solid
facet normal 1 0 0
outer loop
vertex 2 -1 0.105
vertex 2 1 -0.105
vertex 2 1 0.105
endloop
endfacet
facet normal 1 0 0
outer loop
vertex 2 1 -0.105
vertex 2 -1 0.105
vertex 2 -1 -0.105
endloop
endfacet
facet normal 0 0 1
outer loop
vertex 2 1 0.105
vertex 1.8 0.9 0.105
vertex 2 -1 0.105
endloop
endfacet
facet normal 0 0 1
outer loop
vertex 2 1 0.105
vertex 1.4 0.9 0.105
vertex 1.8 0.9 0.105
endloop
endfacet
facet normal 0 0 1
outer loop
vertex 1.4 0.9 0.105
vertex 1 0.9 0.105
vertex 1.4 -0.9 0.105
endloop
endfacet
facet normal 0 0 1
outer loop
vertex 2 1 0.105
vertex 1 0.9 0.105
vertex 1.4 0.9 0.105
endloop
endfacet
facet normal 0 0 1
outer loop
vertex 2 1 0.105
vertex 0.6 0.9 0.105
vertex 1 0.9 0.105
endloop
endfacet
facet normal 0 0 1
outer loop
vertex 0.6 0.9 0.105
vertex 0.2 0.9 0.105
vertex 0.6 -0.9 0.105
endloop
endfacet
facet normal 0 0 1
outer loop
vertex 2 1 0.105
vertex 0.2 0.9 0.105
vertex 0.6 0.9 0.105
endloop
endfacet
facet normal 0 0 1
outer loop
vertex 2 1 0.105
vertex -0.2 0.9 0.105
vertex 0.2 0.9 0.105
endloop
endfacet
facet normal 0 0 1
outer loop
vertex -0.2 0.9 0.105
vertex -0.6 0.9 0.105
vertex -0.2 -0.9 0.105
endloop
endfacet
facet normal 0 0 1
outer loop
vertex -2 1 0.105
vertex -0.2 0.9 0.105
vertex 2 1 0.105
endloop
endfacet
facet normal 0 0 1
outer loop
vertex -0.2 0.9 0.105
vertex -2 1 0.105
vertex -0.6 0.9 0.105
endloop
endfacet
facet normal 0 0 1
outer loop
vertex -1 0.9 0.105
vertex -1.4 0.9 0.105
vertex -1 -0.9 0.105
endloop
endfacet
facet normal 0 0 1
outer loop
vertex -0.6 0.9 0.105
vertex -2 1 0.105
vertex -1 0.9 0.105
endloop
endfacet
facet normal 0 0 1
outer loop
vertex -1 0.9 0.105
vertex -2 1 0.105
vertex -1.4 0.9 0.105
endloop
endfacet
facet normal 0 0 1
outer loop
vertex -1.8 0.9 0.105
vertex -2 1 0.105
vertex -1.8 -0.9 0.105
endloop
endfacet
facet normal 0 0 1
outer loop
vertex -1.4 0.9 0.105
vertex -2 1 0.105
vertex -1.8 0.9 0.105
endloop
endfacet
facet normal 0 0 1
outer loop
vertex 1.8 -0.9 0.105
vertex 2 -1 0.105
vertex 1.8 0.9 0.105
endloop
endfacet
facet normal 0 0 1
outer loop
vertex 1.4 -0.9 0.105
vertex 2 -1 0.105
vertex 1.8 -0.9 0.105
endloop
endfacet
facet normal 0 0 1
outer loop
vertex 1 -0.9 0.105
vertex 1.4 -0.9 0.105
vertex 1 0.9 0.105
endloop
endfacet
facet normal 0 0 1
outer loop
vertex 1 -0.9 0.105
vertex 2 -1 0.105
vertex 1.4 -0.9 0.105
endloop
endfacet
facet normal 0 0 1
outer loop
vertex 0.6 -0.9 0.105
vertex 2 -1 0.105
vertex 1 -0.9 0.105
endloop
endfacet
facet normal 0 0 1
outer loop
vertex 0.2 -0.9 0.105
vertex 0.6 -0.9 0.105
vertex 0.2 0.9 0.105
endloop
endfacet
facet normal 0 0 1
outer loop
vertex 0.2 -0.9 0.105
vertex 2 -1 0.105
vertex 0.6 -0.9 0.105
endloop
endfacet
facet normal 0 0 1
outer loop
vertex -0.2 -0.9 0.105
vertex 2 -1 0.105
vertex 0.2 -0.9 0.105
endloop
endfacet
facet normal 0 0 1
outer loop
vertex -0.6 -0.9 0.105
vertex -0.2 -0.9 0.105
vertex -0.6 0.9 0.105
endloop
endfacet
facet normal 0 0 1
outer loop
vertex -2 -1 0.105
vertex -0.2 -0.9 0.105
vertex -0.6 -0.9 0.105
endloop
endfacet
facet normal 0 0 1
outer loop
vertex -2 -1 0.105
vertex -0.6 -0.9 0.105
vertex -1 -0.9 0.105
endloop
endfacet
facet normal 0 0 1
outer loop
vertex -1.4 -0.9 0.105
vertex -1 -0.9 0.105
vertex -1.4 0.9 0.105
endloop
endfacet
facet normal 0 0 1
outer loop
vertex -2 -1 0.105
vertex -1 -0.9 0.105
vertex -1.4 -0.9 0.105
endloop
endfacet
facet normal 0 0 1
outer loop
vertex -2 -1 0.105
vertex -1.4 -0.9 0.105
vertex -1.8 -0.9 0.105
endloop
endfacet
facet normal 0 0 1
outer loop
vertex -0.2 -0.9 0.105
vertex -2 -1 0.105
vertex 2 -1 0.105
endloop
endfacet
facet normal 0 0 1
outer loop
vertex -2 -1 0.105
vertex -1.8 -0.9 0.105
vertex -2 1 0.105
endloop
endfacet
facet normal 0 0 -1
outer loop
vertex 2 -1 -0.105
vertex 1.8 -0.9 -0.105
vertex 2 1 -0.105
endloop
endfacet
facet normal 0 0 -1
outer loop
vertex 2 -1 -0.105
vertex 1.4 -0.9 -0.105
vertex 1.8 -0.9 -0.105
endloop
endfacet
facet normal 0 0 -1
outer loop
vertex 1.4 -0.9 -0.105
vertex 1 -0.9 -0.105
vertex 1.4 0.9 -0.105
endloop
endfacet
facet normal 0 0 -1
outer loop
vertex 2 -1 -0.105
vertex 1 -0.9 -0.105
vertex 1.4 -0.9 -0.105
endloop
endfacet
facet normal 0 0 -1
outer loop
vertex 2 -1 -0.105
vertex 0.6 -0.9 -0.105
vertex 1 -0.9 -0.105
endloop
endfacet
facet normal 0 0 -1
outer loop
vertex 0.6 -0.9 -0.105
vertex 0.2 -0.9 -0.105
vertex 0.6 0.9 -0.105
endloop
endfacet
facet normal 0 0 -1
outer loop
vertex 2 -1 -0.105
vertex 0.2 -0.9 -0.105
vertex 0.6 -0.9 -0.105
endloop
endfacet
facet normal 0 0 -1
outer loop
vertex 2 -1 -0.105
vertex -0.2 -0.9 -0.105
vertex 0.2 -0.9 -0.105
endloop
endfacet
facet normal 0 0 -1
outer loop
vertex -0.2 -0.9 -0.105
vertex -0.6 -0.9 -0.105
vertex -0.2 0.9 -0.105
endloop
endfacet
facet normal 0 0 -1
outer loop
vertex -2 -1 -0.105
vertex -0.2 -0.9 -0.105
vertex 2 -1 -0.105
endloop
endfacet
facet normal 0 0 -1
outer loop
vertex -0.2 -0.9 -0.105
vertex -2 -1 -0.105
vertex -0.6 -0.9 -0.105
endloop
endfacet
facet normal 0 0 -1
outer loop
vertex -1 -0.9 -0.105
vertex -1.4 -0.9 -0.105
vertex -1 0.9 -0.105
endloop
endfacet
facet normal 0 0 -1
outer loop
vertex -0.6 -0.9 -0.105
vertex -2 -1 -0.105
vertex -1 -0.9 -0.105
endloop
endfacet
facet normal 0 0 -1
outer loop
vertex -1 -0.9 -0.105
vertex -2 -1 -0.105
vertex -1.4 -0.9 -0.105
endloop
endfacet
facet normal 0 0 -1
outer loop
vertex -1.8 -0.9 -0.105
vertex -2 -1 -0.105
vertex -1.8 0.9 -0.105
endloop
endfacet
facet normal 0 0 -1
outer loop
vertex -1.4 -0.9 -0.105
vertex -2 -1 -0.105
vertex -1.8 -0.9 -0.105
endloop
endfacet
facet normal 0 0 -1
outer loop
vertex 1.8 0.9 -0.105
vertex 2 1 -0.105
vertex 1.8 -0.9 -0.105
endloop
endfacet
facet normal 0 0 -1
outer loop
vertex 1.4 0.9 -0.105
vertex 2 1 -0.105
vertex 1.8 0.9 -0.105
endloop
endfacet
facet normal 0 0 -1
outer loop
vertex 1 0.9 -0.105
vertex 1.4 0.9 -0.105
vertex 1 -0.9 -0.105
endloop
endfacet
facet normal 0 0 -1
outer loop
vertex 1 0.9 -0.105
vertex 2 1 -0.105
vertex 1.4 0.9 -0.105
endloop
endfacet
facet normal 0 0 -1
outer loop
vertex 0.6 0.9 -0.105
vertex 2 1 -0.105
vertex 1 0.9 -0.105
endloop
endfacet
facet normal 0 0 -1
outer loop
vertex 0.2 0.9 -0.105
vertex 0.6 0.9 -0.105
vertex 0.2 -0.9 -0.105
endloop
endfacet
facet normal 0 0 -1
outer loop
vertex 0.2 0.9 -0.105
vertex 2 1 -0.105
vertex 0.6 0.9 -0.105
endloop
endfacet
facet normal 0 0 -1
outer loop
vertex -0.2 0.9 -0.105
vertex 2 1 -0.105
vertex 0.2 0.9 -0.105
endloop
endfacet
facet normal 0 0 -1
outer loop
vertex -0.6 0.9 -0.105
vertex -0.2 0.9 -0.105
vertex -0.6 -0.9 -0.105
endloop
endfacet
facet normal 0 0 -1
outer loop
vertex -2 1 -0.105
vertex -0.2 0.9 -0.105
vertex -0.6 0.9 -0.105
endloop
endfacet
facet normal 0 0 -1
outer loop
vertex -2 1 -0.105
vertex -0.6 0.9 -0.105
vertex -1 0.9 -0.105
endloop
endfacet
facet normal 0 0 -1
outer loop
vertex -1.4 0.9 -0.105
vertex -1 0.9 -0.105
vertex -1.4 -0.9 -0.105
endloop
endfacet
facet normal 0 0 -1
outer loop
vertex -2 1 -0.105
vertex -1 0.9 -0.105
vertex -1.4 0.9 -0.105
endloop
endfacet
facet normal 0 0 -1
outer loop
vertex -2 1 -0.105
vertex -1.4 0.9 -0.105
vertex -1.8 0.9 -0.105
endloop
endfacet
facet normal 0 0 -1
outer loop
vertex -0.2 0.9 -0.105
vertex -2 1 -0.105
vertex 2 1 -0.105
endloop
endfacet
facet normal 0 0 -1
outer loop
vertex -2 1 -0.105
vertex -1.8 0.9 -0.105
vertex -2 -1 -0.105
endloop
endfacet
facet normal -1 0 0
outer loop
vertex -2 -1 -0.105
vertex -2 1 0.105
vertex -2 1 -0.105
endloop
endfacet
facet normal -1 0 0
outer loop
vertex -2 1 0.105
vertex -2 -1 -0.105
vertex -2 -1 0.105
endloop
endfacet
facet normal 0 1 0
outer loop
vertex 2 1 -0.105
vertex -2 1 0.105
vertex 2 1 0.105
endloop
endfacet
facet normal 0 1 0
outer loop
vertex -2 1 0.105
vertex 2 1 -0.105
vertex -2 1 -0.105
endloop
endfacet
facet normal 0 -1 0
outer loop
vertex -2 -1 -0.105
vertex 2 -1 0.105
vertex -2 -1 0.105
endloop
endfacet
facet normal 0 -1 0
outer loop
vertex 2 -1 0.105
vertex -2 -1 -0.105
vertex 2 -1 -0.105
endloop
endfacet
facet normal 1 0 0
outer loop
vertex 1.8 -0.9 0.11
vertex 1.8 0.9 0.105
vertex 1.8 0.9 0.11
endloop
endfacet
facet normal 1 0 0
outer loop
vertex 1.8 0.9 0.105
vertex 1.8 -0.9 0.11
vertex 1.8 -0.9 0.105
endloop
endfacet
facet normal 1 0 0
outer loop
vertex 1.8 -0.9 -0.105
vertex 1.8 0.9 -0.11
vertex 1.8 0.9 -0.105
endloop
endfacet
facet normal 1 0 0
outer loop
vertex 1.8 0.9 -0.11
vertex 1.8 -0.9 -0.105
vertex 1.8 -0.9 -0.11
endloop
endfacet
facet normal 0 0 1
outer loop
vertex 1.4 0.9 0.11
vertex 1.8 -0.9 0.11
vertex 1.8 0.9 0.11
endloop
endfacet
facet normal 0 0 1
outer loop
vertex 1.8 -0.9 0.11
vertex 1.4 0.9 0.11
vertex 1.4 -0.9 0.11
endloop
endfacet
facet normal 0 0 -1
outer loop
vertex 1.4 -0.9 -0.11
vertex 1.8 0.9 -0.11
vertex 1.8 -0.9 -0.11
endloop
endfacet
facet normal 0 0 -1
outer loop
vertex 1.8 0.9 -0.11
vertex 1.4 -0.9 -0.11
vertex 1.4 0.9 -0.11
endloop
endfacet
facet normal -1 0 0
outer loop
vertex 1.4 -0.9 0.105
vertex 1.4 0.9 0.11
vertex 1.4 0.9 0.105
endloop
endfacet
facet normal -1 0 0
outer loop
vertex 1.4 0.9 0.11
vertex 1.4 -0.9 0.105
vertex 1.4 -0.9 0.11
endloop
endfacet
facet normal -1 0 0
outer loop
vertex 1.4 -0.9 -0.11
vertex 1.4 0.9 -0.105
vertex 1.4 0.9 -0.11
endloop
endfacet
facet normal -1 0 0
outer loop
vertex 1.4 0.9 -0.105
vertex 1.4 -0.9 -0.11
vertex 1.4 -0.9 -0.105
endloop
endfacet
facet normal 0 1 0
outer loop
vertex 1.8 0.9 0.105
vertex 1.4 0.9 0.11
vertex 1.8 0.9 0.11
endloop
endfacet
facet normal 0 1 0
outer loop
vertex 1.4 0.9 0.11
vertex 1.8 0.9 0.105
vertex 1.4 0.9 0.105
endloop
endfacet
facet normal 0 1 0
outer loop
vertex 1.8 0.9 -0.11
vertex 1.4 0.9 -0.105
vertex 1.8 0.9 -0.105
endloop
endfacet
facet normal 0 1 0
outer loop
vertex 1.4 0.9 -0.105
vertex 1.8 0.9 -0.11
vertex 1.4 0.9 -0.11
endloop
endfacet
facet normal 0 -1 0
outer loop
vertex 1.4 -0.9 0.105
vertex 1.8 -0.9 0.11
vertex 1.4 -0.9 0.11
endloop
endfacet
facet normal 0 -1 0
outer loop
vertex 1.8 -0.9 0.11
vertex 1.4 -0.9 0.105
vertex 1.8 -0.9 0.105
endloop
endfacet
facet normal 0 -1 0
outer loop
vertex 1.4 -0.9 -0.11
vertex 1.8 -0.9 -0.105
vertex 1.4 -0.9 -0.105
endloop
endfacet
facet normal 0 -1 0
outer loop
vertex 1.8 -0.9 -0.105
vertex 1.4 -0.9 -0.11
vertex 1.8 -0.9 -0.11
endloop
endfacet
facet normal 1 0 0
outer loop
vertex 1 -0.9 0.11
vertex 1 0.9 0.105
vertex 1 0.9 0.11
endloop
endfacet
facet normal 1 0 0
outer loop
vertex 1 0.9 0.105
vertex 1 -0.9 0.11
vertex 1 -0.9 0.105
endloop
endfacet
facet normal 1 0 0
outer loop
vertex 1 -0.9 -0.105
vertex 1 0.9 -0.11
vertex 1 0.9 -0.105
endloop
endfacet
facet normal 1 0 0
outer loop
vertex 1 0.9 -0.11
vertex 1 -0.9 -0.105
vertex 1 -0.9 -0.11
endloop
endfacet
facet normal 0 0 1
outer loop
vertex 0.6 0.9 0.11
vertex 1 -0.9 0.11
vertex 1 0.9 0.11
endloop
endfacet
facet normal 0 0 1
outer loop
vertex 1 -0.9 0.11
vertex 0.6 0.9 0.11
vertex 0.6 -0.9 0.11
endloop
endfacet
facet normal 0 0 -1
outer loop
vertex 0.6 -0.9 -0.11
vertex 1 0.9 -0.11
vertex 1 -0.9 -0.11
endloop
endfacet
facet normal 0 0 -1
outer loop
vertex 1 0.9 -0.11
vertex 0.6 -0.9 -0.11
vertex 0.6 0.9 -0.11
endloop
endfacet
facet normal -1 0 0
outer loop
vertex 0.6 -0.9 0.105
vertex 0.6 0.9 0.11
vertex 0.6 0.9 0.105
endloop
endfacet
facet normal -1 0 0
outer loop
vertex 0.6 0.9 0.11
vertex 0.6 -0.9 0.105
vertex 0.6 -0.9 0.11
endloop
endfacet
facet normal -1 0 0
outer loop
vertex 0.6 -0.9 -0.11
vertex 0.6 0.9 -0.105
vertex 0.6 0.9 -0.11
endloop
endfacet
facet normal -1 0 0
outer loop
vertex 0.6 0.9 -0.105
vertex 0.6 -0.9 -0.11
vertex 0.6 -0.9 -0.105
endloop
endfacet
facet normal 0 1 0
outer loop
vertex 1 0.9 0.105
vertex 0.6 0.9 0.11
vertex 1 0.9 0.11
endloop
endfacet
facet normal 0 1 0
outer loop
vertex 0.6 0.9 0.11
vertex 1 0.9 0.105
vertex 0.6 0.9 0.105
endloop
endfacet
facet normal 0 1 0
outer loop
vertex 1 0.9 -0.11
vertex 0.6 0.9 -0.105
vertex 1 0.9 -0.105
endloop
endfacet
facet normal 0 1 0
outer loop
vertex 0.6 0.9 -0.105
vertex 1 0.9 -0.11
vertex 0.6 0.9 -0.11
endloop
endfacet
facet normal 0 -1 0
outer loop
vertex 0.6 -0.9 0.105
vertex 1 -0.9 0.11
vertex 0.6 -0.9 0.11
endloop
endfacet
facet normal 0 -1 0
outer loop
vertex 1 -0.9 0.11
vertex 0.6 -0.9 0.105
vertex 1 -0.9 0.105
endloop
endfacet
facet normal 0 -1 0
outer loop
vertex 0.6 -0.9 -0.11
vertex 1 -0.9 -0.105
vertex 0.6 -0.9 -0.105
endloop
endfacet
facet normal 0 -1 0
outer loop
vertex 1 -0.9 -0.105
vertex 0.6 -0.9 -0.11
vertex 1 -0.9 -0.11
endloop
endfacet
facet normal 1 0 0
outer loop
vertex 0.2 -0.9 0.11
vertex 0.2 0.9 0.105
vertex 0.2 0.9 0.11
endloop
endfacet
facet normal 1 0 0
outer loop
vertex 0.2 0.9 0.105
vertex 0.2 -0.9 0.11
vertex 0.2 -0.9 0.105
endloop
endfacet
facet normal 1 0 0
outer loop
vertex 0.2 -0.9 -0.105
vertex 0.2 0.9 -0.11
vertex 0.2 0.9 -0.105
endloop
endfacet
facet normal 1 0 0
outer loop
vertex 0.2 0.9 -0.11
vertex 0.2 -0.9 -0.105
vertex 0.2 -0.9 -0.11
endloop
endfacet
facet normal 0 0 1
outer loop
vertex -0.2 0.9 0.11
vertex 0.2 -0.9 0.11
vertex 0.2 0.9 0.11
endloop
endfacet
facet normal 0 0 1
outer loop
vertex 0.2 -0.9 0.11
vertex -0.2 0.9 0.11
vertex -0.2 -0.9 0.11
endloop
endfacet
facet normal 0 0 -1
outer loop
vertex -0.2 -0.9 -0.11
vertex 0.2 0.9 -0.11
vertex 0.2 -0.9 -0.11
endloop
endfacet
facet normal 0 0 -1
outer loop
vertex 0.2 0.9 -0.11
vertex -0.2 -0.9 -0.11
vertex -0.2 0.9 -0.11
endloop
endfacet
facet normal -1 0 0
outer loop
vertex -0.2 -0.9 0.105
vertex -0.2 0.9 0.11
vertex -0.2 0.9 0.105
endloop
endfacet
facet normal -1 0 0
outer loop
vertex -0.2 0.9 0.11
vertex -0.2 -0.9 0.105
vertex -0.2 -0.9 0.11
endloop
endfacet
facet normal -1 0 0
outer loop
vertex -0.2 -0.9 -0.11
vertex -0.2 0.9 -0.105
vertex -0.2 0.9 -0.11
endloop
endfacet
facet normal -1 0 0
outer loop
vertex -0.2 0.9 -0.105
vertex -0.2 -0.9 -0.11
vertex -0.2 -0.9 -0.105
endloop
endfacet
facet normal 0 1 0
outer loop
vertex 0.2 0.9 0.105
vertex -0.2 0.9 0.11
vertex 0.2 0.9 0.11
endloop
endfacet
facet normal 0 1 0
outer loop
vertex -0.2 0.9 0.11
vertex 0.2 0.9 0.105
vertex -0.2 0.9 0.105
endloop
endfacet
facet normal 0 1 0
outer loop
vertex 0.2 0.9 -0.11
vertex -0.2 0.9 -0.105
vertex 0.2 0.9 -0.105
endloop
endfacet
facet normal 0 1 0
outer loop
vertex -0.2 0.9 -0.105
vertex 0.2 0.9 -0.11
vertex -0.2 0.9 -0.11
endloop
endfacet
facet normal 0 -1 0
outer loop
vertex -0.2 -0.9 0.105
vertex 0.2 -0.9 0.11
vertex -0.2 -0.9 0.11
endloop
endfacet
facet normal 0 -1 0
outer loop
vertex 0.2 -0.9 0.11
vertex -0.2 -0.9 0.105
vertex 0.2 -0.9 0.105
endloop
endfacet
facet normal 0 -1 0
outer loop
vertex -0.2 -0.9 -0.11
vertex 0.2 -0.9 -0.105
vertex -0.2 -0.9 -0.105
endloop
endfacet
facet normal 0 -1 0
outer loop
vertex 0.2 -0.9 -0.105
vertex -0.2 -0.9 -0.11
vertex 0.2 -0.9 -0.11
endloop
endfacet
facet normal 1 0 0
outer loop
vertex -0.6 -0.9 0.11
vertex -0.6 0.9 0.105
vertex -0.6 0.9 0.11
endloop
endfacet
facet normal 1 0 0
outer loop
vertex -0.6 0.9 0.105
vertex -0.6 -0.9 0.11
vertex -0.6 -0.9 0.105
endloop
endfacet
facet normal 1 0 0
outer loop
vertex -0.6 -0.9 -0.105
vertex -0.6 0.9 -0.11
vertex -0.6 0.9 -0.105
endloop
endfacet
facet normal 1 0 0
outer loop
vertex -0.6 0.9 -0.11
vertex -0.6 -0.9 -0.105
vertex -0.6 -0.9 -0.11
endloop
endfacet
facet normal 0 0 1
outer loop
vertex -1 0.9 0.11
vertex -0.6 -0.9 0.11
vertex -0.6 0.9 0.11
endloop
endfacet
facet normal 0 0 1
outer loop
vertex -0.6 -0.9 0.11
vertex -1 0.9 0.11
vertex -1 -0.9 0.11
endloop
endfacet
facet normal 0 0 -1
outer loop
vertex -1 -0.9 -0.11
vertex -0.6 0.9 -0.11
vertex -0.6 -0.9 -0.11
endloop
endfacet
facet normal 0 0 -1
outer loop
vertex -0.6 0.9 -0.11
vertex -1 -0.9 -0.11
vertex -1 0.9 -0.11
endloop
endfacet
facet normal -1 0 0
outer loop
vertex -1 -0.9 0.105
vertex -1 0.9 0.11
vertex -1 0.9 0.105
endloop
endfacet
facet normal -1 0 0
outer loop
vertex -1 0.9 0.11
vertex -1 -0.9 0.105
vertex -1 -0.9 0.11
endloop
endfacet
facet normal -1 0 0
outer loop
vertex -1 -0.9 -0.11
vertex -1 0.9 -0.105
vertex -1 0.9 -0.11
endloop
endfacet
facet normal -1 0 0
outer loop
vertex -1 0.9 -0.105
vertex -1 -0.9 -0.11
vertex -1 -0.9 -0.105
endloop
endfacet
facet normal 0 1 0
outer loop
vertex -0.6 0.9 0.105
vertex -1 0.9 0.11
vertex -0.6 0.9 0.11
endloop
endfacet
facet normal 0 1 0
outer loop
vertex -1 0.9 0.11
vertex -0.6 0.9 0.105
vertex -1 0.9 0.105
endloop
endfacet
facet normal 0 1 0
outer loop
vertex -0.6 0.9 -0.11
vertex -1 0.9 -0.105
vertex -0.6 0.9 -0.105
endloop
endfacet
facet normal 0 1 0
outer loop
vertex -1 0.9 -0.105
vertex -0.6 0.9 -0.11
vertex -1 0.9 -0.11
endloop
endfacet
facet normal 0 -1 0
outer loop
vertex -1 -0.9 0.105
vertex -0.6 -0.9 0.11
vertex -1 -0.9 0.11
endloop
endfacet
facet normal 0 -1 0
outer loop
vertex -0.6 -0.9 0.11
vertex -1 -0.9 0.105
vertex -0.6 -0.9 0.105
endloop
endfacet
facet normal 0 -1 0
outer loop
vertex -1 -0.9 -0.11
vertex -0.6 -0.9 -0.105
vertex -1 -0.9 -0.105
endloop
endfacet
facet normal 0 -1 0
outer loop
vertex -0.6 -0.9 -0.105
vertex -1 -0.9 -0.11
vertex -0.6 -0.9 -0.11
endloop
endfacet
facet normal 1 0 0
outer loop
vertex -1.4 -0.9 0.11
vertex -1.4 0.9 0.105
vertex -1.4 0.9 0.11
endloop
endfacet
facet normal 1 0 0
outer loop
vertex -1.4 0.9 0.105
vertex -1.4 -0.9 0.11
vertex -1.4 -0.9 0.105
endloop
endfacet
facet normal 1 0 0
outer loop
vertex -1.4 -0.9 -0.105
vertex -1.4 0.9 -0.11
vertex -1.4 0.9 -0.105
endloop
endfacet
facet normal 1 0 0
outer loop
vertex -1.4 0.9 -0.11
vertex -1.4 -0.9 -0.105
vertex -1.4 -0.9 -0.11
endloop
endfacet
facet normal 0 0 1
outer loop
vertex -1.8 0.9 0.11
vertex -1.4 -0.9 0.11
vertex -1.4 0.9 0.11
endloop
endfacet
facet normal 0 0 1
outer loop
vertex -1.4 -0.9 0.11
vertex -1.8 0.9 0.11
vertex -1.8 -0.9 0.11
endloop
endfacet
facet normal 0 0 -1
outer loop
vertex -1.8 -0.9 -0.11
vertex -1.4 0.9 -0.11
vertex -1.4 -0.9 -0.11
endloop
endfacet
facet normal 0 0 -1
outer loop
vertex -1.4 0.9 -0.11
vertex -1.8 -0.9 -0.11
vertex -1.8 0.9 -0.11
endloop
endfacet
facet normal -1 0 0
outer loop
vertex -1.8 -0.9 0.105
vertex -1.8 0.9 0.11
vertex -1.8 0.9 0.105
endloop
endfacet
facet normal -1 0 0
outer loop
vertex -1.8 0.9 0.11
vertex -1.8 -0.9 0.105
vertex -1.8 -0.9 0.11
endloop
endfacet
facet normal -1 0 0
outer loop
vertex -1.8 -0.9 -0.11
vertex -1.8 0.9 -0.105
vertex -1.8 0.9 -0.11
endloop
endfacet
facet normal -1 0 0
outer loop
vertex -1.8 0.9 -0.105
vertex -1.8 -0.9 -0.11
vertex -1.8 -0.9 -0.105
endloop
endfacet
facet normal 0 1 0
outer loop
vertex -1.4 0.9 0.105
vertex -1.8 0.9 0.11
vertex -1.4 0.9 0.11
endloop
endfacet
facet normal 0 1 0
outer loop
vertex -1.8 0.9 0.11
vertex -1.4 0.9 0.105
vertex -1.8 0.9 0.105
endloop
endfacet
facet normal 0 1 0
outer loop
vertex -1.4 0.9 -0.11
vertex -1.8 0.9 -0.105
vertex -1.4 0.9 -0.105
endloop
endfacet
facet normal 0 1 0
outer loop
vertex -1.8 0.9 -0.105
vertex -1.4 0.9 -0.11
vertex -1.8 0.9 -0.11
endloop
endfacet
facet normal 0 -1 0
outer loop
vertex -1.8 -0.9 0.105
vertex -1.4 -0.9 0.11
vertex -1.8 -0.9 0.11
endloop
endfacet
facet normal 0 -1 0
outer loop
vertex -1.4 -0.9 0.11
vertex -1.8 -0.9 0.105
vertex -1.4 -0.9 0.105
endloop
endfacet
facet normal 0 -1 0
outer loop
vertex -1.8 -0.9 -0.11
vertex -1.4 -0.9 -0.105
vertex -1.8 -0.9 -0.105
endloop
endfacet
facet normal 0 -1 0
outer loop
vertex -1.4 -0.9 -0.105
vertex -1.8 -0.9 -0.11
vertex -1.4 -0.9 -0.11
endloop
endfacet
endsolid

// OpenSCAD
module Street_02(){

union(){
color("#3b4747")
cube([4,2,0.21], center = true);

translate([1.6,0,0])
color("white")
cube([0.4,1.8,0.22], center = true);

translate([0.8,0,0])
color("white")
cube([0.4,1.8,0.22], center = true);


translate([0,0,0])
color("white")
cube([0.4,1.8,0.22], center = true);


translate([-0.8,0,0])
color("white")
cube([0.4,1.8,0.22], center = true);

translate([-1.6,0,0])
color("white")
cube([0.4,1.8,0.22], center = true);

}

}

Street_02();
